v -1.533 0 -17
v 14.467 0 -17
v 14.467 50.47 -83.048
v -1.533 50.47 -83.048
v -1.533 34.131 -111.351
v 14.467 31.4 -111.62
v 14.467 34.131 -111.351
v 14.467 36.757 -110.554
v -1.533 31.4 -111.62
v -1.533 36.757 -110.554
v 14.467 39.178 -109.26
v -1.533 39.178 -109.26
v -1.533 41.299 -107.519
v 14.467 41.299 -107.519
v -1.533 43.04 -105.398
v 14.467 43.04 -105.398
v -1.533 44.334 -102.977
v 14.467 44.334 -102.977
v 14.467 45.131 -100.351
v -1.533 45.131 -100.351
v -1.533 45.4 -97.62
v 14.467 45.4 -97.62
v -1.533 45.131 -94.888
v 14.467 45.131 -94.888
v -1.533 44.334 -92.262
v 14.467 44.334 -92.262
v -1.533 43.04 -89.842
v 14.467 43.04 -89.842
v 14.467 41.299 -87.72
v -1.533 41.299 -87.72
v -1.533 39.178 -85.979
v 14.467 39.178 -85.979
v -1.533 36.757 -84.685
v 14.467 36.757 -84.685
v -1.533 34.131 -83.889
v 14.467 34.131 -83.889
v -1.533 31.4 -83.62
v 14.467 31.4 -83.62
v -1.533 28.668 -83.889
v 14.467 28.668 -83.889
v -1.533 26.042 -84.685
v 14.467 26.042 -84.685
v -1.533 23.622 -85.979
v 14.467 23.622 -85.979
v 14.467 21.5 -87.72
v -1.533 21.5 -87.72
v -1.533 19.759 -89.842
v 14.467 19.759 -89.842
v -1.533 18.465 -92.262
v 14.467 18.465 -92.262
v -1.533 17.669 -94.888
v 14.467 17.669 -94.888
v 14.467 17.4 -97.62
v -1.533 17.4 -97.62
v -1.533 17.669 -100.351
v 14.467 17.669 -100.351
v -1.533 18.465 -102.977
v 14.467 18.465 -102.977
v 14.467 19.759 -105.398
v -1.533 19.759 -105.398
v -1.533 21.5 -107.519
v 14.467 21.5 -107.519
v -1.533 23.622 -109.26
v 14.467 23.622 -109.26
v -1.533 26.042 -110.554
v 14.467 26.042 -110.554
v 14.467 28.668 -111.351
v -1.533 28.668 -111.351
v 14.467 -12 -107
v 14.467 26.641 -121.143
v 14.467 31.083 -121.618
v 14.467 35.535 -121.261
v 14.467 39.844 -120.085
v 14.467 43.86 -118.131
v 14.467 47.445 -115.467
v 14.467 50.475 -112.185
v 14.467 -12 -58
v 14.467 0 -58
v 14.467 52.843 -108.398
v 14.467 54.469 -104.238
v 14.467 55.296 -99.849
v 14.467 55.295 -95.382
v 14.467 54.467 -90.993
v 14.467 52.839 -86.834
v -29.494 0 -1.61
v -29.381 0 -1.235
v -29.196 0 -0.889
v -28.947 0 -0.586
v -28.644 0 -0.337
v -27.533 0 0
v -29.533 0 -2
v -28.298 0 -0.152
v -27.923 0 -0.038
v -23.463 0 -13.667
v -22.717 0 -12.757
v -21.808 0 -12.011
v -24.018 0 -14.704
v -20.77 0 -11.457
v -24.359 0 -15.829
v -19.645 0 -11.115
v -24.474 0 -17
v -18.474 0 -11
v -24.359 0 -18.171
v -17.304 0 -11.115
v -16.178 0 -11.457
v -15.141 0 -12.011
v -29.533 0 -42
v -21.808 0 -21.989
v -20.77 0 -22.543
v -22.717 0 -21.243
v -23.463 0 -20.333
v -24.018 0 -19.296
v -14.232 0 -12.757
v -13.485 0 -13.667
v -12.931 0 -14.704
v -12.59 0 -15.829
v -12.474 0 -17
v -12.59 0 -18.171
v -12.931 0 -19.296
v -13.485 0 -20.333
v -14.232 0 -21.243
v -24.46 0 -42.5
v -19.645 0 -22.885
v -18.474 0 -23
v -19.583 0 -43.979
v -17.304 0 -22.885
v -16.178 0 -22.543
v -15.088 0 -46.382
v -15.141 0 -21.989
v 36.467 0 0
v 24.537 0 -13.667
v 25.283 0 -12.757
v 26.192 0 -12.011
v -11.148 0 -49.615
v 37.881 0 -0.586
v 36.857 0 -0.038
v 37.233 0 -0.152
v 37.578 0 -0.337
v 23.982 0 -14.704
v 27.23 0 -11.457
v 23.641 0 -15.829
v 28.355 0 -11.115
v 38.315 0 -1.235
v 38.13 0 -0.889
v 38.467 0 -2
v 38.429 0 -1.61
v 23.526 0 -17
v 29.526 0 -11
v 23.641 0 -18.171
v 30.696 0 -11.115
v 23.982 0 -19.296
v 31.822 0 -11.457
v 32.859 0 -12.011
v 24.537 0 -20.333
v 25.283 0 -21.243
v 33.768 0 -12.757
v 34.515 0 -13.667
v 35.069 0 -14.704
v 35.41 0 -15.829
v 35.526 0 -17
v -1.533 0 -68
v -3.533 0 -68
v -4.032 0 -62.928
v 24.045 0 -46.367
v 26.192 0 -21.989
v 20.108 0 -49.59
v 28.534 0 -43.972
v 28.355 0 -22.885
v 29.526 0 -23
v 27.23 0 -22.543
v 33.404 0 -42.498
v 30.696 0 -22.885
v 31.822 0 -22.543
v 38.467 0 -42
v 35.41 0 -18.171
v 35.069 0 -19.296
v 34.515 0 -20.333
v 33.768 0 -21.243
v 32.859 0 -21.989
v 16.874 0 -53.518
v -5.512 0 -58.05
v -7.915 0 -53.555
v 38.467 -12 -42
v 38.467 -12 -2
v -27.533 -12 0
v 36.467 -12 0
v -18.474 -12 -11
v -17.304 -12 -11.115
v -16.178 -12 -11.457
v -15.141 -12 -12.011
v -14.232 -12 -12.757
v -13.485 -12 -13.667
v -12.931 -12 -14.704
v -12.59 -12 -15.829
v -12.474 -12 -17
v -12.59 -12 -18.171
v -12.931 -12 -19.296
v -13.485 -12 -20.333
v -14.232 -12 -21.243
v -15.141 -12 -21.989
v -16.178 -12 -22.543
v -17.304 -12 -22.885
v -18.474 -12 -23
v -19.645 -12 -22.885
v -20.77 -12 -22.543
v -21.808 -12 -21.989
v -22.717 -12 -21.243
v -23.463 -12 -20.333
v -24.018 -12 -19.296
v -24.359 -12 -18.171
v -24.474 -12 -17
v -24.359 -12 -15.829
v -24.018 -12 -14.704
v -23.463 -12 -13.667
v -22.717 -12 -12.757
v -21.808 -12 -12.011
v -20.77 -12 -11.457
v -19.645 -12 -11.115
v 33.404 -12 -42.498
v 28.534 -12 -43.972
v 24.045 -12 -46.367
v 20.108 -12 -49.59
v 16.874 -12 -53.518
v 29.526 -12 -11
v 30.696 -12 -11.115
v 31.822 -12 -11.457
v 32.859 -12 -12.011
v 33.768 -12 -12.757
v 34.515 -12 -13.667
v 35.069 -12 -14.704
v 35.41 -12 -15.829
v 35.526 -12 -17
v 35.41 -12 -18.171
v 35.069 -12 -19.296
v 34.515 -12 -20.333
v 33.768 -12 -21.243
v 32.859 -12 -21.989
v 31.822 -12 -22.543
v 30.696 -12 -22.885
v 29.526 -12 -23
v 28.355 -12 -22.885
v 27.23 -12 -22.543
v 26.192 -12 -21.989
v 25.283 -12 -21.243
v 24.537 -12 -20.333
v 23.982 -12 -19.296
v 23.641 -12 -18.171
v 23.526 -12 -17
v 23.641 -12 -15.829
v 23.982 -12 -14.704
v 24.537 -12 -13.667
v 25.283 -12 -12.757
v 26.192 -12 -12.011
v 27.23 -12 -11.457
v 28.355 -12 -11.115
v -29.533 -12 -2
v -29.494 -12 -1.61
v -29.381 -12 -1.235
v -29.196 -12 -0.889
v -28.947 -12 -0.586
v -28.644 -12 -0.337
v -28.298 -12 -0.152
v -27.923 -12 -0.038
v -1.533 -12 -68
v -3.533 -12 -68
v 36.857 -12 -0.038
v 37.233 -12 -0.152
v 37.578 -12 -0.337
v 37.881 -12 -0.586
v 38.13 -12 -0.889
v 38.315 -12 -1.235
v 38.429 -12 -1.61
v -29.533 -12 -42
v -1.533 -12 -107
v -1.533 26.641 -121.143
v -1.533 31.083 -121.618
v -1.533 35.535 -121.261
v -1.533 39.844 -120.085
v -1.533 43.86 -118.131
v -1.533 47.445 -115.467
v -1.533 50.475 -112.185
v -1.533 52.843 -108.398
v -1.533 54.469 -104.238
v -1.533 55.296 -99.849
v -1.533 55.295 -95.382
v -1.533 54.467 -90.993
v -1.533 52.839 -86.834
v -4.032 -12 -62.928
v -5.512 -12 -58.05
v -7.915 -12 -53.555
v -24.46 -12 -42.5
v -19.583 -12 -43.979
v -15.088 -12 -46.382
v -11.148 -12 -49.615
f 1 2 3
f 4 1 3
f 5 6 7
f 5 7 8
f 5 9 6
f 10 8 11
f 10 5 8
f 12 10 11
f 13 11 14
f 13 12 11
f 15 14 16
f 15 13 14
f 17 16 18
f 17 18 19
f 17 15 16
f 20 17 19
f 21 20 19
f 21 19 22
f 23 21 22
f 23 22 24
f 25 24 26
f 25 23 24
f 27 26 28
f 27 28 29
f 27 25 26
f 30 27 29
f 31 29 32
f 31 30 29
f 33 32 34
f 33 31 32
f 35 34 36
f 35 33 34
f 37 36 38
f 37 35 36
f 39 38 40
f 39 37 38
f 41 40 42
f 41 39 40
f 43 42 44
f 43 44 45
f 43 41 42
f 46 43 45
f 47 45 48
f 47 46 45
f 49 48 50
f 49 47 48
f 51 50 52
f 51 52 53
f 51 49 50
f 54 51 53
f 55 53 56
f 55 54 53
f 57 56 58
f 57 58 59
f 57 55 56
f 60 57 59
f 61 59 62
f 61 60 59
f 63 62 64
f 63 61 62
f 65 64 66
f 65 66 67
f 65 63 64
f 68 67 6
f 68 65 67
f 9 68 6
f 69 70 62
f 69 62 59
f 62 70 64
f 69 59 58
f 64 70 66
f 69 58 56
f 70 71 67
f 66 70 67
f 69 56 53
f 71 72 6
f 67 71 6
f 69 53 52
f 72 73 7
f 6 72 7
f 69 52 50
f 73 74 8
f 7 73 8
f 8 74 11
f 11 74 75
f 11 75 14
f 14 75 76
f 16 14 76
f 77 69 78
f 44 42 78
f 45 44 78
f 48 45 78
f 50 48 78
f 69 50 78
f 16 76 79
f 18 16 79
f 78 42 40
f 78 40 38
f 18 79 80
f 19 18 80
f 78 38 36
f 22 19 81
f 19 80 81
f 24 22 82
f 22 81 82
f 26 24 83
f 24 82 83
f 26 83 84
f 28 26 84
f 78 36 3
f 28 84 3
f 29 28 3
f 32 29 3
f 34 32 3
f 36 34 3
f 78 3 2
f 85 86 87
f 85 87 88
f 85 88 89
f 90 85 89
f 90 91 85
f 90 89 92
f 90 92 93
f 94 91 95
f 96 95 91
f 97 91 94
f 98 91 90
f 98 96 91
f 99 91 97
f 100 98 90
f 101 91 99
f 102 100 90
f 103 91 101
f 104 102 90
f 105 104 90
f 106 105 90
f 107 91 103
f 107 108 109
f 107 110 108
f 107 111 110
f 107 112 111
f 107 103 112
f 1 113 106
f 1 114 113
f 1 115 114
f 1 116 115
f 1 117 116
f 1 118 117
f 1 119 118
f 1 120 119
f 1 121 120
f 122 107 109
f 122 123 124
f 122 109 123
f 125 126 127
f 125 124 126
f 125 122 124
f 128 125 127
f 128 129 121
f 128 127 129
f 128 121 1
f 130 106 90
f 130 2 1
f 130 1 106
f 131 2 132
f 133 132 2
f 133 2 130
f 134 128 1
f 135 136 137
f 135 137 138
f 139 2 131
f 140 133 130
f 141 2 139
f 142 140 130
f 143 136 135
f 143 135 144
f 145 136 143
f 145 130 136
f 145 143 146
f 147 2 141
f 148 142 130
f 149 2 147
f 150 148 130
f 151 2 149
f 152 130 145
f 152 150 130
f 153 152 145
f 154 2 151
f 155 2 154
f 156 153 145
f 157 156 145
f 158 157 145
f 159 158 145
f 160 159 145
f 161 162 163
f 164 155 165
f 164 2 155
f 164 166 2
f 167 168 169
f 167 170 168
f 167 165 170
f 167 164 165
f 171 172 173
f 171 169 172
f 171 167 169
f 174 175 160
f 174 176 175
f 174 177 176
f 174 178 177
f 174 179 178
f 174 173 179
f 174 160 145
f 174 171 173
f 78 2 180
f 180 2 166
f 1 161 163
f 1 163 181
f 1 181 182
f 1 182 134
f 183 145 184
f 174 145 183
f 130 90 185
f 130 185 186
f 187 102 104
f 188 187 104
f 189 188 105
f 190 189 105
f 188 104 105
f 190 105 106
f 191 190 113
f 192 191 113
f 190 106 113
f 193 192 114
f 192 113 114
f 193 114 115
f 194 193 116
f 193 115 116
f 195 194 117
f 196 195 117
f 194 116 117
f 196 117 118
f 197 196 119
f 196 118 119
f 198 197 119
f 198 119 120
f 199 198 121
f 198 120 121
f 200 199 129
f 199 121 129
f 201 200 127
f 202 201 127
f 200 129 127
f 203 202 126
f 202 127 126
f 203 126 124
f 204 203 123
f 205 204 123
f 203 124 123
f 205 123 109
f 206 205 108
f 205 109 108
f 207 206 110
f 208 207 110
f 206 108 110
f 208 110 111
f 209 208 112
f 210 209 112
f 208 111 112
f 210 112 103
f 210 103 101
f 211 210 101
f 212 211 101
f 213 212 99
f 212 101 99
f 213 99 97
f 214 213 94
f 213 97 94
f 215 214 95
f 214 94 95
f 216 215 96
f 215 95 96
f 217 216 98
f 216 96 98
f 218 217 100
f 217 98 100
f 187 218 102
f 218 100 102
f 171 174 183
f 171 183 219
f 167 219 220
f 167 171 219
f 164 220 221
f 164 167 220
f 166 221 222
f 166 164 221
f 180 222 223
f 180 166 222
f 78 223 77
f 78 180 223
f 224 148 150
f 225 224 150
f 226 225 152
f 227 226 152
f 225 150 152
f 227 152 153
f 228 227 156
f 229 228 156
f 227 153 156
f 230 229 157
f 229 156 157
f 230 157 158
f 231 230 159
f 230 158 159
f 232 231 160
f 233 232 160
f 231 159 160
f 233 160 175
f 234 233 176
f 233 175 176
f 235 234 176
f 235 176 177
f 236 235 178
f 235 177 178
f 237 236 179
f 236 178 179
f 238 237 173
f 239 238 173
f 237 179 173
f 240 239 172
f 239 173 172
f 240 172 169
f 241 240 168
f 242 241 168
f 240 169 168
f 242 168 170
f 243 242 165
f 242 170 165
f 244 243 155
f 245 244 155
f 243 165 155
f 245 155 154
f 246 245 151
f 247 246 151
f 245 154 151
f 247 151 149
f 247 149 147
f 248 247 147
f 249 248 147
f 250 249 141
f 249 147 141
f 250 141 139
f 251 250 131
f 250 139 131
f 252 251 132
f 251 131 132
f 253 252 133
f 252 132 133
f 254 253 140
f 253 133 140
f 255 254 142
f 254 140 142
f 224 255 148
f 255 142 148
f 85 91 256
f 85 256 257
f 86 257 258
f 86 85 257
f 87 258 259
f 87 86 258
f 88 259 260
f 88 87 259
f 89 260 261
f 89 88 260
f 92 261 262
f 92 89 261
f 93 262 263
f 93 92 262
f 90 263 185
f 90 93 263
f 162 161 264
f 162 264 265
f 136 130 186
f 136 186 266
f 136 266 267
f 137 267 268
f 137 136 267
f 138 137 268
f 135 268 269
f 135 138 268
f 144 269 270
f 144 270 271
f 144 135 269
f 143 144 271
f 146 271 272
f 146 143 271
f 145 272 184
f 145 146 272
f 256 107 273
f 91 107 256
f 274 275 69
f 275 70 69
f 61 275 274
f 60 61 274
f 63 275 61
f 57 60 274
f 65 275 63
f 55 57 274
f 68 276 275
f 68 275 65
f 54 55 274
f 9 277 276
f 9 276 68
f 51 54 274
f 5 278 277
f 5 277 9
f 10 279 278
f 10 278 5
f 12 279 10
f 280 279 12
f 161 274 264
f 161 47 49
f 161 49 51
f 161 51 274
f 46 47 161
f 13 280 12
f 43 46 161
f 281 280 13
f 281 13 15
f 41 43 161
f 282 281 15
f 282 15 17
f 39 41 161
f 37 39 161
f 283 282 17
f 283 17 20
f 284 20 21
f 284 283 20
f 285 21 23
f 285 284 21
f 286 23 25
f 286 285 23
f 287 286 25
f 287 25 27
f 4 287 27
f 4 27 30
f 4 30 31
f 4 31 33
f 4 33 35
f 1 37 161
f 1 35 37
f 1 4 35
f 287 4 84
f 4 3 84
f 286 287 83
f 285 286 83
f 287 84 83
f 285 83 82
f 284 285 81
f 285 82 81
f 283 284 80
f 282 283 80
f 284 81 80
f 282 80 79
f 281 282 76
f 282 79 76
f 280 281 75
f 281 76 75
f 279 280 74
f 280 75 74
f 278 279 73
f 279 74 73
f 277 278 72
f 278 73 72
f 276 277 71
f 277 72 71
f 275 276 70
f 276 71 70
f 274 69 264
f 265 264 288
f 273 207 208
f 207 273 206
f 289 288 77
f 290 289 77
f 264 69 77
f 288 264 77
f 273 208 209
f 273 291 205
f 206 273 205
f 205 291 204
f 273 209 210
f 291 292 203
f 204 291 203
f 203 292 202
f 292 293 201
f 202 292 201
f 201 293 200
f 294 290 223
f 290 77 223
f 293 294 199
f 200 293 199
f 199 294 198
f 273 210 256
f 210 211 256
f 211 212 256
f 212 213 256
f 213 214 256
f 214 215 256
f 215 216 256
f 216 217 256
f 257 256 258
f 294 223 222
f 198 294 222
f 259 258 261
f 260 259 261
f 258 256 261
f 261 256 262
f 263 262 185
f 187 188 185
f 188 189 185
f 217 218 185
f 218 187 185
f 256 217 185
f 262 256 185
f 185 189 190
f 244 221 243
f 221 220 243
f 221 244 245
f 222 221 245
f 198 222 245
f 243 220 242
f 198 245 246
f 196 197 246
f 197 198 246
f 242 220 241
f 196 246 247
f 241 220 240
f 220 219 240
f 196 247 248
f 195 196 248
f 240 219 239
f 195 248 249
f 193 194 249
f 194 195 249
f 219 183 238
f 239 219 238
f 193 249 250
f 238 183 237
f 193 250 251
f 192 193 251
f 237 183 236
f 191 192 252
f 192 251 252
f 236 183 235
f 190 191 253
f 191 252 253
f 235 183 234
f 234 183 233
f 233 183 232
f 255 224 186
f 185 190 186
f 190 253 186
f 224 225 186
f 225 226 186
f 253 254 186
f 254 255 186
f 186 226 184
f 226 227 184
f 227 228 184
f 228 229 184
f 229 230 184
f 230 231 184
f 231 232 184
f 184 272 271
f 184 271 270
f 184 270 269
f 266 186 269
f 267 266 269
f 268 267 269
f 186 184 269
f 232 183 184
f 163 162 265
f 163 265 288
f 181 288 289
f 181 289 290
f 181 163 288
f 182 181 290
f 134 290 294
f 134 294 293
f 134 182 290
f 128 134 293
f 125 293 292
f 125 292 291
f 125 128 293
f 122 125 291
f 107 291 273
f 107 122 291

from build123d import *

# Parameters (mm, degrees)
SKETCH3_R           = 6
BOSS_EXTRUDE3_DEPTH = 12
SKETCH4_R           = 14
BOSS_EXTRUDE4_DEPTH = 8


with BuildPart() as part:
    # Sketch3 → Boss-Extrude3 (new body)
    with BuildSketch(Plane(origin=(0, 0, 0), x_dir=(1, 0, 0), z_dir=(0, 1, 0))):
        with BuildLine():
            ThreePointArc((-29.532846715, 2), (-28.947060278, 0.585786438), (-27.532846715, 0))
            Line((-27.532846715, 0), (36.467153285, 0))
            ThreePointArc((36.467153285, 0), (37.881366847, 0.585786438), (38.467153285, 2))
            Line((38.467153285, 2), (38.467153285, 42))
            ThreePointArc((38.467153285, 42), (20.082376974, 49.615223689), (12.467153285, 68))
            Line((12.467153285, 68), (-3.532846715, 68))
            ThreePointArc((-3.532846715, 68), (-11.148070404, 49.615223689), (-29.532846715, 42))
            Line((-29.532846715, 42), (-29.532846715, 2))
        make_face()
        with Locations(Location((-18.474270286, 17, 0), (0, 0, 270))):
            Circle(SKETCH3_R, mode=Mode.SUBTRACT)
        with Locations(Location((29.525729714, 17, 0), (0, 0, 270))):
            Circle(SKETCH3_R, mode=Mode.SUBTRACT)
    extrude(amount=-BOSS_EXTRUDE3_DEPTH)

    # Sketch4 → Boss-Extrude4 (add, symmetric)
    with BuildSketch(Plane(origin=(6.467153285, 0, 0), x_dir=(0, 0, -1), z_dir=(1, 0, 0))):
        with BuildLine():
            Line((17, 0), (83.047673955, 50.469532025))
            ThreePointArc((83.047673955, 50.469532025), (110.346676743, 51.747263432), (121.143218593, 26.641430746))
            Line((121.143218593, 26.641430746), (107, -12))
            Line((107, -12), (17, -12))
            Line((17, -12), (17, 0))
        make_face()
        with Locations((97.619641201, 31.399718953)):
            Circle(SKETCH4_R, mode=Mode.SUBTRACT)
    extrude(amount=BOSS_EXTRUDE4_DEPTH, both=True)


solid = part.part
